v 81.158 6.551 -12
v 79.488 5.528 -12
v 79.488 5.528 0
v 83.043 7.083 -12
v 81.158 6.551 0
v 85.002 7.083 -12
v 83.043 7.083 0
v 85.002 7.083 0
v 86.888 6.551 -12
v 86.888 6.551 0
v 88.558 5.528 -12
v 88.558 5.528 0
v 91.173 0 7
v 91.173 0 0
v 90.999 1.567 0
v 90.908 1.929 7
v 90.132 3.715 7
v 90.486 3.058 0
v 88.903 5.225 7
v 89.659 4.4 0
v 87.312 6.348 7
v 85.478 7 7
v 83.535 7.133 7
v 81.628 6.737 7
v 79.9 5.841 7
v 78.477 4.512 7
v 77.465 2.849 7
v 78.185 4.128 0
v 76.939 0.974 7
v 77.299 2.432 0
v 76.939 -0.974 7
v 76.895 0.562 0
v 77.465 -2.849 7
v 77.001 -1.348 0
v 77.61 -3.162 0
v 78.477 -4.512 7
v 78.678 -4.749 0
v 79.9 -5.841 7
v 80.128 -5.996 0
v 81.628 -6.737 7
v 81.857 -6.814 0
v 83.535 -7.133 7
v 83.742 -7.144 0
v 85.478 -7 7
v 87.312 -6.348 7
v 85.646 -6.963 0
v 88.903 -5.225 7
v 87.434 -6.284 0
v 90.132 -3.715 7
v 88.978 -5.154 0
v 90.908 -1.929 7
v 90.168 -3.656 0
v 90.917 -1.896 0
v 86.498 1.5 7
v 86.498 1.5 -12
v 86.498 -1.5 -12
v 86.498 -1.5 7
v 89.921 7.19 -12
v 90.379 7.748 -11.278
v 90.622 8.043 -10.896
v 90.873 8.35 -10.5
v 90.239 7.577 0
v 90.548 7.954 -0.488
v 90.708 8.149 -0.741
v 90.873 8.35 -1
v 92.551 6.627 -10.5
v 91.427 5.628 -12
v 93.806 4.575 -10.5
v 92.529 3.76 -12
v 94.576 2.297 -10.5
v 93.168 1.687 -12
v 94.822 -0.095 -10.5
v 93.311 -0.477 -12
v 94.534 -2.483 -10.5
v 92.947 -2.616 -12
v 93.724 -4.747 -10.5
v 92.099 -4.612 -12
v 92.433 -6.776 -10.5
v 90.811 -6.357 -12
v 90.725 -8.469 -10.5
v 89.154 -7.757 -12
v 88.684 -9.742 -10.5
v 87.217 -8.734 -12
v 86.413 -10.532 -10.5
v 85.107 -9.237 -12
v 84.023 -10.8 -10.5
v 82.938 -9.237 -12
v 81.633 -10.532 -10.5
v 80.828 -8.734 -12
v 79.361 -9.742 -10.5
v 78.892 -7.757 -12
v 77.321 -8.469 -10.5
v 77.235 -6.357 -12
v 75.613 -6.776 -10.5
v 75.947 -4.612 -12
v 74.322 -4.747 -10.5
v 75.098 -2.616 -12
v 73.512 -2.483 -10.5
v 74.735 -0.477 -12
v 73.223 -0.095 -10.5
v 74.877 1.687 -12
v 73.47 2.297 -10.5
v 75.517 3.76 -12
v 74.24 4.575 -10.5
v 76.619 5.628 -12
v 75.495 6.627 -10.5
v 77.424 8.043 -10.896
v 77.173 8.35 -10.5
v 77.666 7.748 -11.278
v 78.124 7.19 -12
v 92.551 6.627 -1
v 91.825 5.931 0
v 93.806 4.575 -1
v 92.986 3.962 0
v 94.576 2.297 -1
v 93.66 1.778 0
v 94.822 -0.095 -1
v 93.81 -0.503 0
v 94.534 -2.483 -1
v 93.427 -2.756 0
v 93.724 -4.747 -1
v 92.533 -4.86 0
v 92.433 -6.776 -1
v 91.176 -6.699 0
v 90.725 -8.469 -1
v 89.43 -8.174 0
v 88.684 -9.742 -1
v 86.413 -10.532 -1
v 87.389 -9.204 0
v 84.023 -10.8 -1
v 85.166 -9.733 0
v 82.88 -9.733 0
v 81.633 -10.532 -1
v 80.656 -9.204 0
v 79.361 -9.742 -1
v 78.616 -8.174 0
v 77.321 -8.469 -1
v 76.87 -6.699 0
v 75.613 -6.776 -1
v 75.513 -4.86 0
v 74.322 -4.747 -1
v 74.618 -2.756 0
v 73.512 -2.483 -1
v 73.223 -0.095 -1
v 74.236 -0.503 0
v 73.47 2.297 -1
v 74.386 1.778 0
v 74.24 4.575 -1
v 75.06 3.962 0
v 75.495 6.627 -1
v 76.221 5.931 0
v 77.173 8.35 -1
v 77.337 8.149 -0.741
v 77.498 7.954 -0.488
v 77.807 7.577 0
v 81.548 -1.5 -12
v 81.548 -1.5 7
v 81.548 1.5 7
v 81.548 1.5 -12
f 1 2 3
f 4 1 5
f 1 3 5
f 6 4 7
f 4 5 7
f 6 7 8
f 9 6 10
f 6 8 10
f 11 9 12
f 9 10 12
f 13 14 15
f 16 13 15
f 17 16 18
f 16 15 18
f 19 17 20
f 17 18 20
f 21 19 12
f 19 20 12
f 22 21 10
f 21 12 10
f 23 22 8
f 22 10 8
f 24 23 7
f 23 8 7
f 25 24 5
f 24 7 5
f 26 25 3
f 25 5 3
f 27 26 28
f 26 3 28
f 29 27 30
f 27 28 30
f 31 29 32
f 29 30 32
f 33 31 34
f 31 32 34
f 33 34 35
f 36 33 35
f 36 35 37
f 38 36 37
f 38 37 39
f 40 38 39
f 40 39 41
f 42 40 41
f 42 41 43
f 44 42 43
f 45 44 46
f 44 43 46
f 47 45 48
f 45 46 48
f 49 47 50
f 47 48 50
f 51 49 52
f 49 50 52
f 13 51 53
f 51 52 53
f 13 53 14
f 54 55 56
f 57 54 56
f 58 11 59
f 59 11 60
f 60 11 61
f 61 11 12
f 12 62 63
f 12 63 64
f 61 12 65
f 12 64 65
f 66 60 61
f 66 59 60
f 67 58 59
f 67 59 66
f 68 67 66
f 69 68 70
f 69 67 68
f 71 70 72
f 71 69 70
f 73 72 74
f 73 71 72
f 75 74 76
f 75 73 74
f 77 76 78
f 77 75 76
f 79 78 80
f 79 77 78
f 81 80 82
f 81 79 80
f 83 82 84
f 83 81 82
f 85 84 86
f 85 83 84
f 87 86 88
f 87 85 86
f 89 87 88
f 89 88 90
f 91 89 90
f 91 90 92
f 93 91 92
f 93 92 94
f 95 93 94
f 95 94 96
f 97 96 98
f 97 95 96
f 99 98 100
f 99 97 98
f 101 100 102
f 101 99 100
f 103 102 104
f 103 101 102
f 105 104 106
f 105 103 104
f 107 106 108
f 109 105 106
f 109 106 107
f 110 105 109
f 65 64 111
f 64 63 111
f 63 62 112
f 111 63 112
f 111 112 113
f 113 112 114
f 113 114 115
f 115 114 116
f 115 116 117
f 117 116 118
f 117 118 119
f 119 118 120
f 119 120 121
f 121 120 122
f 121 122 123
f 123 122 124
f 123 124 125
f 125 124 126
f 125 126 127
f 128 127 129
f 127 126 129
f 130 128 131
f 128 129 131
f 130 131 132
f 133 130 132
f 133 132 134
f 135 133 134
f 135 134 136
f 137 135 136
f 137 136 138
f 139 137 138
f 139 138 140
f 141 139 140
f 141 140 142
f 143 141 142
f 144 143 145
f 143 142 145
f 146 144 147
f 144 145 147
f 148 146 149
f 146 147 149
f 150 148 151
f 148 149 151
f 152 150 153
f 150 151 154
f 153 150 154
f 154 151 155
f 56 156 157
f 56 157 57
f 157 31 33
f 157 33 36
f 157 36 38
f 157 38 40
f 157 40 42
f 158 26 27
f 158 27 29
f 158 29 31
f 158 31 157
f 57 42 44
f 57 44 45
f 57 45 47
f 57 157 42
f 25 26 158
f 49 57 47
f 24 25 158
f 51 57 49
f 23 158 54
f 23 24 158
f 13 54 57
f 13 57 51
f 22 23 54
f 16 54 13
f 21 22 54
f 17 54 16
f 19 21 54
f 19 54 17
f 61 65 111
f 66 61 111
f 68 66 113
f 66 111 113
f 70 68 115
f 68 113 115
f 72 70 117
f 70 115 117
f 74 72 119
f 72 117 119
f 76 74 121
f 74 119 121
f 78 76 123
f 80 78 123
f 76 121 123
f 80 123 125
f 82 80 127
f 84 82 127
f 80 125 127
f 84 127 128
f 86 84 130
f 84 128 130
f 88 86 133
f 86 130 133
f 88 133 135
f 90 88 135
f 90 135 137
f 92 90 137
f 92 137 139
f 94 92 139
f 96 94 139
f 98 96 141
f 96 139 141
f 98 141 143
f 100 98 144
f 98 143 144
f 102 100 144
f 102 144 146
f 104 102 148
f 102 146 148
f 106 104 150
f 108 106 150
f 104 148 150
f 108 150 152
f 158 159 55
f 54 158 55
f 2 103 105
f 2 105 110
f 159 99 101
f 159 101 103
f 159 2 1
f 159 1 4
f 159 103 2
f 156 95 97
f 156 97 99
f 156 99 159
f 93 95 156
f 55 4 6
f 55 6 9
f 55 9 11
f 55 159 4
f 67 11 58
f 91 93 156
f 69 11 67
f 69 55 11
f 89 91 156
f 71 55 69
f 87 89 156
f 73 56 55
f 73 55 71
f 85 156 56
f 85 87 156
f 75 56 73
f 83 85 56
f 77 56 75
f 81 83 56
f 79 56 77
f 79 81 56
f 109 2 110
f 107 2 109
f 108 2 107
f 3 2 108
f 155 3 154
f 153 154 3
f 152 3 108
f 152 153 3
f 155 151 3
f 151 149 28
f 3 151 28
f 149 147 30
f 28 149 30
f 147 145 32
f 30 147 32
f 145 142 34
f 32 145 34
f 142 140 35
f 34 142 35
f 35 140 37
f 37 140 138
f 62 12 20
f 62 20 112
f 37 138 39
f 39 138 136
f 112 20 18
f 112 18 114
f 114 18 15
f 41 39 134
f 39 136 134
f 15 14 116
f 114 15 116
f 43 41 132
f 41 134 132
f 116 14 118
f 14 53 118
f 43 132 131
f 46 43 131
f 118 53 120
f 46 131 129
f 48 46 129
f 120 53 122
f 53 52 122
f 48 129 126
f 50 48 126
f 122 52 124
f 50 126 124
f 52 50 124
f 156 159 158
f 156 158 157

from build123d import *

# Parameters (mm, degrees)
SKETCH009_R     = 7.15
PAD009_DEPTH    = 7
PAD010_DEPTH    = 12
SKETCH011_W     = 4.95
SKETCH011_H     = 3
POCKET_DEPTH    = 19.001
CHAMFER_SIZE    = 1.5
CHAMFER001_SIZE = 1


with BuildPart() as part:
    # Sketch009 → Pad009 (new body)
    with BuildSketch(Plane.XY):
        with Locations((84.022852, 0)):
            Circle(SKETCH009_R)
    extrude(amount=PAD009_DEPTH)

    # Sketch010 (on Face2 of Pad009) → Pad010 (join)
    with BuildSketch(Plane(origin=(0, 0, 0), x_dir=(1, 0, 0), z_dir=(0, 0, -1))):
        with BuildLine():
            ThreePointArc((90.872852, -8.349701), (84.022852, 10.8), (77.172852, -8.349701))
            Line((79.487898, -5.527811), (77.172852, -8.349701))
            ThreePointArc((79.487898, -5.527811), (84.022852, -7.15), (88.557806, -5.527811))
            Line((88.557806, -5.527811), (90.872852, -8.349701))
        make_face()
    extrude(amount=PAD010_DEPTH)

    # Sketch011 (on Face8 of Pad010) → Pocket (cut, through all)
    with BuildSketch(Plane(origin=(0, 0, -12), x_dir=(1, 0, 0), z_dir=(0, 0, -1))):
        with Locations((84.022852, 0)):
            Rectangle(SKETCH011_W, SKETCH011_H)
    extrude(amount=-POCKET_DEPTH, mode=Mode.SUBTRACT)

    # Chamfer
    chamfer_edges = [part.edges().sort_by_distance(p)[0] for p in [
        (84.022852, -10.8, -12),
    ]]
    chamfer(chamfer_edges, length=CHAMFER_SIZE)

    # Chamfer001
    chamfer001_edges = [part.edges().sort_by_distance(p)[0] for p in [
        (84.022852, -10.8, 0),
    ]]
    chamfer(chamfer001_edges, length=CHAMFER001_SIZE)


solid = part.part
